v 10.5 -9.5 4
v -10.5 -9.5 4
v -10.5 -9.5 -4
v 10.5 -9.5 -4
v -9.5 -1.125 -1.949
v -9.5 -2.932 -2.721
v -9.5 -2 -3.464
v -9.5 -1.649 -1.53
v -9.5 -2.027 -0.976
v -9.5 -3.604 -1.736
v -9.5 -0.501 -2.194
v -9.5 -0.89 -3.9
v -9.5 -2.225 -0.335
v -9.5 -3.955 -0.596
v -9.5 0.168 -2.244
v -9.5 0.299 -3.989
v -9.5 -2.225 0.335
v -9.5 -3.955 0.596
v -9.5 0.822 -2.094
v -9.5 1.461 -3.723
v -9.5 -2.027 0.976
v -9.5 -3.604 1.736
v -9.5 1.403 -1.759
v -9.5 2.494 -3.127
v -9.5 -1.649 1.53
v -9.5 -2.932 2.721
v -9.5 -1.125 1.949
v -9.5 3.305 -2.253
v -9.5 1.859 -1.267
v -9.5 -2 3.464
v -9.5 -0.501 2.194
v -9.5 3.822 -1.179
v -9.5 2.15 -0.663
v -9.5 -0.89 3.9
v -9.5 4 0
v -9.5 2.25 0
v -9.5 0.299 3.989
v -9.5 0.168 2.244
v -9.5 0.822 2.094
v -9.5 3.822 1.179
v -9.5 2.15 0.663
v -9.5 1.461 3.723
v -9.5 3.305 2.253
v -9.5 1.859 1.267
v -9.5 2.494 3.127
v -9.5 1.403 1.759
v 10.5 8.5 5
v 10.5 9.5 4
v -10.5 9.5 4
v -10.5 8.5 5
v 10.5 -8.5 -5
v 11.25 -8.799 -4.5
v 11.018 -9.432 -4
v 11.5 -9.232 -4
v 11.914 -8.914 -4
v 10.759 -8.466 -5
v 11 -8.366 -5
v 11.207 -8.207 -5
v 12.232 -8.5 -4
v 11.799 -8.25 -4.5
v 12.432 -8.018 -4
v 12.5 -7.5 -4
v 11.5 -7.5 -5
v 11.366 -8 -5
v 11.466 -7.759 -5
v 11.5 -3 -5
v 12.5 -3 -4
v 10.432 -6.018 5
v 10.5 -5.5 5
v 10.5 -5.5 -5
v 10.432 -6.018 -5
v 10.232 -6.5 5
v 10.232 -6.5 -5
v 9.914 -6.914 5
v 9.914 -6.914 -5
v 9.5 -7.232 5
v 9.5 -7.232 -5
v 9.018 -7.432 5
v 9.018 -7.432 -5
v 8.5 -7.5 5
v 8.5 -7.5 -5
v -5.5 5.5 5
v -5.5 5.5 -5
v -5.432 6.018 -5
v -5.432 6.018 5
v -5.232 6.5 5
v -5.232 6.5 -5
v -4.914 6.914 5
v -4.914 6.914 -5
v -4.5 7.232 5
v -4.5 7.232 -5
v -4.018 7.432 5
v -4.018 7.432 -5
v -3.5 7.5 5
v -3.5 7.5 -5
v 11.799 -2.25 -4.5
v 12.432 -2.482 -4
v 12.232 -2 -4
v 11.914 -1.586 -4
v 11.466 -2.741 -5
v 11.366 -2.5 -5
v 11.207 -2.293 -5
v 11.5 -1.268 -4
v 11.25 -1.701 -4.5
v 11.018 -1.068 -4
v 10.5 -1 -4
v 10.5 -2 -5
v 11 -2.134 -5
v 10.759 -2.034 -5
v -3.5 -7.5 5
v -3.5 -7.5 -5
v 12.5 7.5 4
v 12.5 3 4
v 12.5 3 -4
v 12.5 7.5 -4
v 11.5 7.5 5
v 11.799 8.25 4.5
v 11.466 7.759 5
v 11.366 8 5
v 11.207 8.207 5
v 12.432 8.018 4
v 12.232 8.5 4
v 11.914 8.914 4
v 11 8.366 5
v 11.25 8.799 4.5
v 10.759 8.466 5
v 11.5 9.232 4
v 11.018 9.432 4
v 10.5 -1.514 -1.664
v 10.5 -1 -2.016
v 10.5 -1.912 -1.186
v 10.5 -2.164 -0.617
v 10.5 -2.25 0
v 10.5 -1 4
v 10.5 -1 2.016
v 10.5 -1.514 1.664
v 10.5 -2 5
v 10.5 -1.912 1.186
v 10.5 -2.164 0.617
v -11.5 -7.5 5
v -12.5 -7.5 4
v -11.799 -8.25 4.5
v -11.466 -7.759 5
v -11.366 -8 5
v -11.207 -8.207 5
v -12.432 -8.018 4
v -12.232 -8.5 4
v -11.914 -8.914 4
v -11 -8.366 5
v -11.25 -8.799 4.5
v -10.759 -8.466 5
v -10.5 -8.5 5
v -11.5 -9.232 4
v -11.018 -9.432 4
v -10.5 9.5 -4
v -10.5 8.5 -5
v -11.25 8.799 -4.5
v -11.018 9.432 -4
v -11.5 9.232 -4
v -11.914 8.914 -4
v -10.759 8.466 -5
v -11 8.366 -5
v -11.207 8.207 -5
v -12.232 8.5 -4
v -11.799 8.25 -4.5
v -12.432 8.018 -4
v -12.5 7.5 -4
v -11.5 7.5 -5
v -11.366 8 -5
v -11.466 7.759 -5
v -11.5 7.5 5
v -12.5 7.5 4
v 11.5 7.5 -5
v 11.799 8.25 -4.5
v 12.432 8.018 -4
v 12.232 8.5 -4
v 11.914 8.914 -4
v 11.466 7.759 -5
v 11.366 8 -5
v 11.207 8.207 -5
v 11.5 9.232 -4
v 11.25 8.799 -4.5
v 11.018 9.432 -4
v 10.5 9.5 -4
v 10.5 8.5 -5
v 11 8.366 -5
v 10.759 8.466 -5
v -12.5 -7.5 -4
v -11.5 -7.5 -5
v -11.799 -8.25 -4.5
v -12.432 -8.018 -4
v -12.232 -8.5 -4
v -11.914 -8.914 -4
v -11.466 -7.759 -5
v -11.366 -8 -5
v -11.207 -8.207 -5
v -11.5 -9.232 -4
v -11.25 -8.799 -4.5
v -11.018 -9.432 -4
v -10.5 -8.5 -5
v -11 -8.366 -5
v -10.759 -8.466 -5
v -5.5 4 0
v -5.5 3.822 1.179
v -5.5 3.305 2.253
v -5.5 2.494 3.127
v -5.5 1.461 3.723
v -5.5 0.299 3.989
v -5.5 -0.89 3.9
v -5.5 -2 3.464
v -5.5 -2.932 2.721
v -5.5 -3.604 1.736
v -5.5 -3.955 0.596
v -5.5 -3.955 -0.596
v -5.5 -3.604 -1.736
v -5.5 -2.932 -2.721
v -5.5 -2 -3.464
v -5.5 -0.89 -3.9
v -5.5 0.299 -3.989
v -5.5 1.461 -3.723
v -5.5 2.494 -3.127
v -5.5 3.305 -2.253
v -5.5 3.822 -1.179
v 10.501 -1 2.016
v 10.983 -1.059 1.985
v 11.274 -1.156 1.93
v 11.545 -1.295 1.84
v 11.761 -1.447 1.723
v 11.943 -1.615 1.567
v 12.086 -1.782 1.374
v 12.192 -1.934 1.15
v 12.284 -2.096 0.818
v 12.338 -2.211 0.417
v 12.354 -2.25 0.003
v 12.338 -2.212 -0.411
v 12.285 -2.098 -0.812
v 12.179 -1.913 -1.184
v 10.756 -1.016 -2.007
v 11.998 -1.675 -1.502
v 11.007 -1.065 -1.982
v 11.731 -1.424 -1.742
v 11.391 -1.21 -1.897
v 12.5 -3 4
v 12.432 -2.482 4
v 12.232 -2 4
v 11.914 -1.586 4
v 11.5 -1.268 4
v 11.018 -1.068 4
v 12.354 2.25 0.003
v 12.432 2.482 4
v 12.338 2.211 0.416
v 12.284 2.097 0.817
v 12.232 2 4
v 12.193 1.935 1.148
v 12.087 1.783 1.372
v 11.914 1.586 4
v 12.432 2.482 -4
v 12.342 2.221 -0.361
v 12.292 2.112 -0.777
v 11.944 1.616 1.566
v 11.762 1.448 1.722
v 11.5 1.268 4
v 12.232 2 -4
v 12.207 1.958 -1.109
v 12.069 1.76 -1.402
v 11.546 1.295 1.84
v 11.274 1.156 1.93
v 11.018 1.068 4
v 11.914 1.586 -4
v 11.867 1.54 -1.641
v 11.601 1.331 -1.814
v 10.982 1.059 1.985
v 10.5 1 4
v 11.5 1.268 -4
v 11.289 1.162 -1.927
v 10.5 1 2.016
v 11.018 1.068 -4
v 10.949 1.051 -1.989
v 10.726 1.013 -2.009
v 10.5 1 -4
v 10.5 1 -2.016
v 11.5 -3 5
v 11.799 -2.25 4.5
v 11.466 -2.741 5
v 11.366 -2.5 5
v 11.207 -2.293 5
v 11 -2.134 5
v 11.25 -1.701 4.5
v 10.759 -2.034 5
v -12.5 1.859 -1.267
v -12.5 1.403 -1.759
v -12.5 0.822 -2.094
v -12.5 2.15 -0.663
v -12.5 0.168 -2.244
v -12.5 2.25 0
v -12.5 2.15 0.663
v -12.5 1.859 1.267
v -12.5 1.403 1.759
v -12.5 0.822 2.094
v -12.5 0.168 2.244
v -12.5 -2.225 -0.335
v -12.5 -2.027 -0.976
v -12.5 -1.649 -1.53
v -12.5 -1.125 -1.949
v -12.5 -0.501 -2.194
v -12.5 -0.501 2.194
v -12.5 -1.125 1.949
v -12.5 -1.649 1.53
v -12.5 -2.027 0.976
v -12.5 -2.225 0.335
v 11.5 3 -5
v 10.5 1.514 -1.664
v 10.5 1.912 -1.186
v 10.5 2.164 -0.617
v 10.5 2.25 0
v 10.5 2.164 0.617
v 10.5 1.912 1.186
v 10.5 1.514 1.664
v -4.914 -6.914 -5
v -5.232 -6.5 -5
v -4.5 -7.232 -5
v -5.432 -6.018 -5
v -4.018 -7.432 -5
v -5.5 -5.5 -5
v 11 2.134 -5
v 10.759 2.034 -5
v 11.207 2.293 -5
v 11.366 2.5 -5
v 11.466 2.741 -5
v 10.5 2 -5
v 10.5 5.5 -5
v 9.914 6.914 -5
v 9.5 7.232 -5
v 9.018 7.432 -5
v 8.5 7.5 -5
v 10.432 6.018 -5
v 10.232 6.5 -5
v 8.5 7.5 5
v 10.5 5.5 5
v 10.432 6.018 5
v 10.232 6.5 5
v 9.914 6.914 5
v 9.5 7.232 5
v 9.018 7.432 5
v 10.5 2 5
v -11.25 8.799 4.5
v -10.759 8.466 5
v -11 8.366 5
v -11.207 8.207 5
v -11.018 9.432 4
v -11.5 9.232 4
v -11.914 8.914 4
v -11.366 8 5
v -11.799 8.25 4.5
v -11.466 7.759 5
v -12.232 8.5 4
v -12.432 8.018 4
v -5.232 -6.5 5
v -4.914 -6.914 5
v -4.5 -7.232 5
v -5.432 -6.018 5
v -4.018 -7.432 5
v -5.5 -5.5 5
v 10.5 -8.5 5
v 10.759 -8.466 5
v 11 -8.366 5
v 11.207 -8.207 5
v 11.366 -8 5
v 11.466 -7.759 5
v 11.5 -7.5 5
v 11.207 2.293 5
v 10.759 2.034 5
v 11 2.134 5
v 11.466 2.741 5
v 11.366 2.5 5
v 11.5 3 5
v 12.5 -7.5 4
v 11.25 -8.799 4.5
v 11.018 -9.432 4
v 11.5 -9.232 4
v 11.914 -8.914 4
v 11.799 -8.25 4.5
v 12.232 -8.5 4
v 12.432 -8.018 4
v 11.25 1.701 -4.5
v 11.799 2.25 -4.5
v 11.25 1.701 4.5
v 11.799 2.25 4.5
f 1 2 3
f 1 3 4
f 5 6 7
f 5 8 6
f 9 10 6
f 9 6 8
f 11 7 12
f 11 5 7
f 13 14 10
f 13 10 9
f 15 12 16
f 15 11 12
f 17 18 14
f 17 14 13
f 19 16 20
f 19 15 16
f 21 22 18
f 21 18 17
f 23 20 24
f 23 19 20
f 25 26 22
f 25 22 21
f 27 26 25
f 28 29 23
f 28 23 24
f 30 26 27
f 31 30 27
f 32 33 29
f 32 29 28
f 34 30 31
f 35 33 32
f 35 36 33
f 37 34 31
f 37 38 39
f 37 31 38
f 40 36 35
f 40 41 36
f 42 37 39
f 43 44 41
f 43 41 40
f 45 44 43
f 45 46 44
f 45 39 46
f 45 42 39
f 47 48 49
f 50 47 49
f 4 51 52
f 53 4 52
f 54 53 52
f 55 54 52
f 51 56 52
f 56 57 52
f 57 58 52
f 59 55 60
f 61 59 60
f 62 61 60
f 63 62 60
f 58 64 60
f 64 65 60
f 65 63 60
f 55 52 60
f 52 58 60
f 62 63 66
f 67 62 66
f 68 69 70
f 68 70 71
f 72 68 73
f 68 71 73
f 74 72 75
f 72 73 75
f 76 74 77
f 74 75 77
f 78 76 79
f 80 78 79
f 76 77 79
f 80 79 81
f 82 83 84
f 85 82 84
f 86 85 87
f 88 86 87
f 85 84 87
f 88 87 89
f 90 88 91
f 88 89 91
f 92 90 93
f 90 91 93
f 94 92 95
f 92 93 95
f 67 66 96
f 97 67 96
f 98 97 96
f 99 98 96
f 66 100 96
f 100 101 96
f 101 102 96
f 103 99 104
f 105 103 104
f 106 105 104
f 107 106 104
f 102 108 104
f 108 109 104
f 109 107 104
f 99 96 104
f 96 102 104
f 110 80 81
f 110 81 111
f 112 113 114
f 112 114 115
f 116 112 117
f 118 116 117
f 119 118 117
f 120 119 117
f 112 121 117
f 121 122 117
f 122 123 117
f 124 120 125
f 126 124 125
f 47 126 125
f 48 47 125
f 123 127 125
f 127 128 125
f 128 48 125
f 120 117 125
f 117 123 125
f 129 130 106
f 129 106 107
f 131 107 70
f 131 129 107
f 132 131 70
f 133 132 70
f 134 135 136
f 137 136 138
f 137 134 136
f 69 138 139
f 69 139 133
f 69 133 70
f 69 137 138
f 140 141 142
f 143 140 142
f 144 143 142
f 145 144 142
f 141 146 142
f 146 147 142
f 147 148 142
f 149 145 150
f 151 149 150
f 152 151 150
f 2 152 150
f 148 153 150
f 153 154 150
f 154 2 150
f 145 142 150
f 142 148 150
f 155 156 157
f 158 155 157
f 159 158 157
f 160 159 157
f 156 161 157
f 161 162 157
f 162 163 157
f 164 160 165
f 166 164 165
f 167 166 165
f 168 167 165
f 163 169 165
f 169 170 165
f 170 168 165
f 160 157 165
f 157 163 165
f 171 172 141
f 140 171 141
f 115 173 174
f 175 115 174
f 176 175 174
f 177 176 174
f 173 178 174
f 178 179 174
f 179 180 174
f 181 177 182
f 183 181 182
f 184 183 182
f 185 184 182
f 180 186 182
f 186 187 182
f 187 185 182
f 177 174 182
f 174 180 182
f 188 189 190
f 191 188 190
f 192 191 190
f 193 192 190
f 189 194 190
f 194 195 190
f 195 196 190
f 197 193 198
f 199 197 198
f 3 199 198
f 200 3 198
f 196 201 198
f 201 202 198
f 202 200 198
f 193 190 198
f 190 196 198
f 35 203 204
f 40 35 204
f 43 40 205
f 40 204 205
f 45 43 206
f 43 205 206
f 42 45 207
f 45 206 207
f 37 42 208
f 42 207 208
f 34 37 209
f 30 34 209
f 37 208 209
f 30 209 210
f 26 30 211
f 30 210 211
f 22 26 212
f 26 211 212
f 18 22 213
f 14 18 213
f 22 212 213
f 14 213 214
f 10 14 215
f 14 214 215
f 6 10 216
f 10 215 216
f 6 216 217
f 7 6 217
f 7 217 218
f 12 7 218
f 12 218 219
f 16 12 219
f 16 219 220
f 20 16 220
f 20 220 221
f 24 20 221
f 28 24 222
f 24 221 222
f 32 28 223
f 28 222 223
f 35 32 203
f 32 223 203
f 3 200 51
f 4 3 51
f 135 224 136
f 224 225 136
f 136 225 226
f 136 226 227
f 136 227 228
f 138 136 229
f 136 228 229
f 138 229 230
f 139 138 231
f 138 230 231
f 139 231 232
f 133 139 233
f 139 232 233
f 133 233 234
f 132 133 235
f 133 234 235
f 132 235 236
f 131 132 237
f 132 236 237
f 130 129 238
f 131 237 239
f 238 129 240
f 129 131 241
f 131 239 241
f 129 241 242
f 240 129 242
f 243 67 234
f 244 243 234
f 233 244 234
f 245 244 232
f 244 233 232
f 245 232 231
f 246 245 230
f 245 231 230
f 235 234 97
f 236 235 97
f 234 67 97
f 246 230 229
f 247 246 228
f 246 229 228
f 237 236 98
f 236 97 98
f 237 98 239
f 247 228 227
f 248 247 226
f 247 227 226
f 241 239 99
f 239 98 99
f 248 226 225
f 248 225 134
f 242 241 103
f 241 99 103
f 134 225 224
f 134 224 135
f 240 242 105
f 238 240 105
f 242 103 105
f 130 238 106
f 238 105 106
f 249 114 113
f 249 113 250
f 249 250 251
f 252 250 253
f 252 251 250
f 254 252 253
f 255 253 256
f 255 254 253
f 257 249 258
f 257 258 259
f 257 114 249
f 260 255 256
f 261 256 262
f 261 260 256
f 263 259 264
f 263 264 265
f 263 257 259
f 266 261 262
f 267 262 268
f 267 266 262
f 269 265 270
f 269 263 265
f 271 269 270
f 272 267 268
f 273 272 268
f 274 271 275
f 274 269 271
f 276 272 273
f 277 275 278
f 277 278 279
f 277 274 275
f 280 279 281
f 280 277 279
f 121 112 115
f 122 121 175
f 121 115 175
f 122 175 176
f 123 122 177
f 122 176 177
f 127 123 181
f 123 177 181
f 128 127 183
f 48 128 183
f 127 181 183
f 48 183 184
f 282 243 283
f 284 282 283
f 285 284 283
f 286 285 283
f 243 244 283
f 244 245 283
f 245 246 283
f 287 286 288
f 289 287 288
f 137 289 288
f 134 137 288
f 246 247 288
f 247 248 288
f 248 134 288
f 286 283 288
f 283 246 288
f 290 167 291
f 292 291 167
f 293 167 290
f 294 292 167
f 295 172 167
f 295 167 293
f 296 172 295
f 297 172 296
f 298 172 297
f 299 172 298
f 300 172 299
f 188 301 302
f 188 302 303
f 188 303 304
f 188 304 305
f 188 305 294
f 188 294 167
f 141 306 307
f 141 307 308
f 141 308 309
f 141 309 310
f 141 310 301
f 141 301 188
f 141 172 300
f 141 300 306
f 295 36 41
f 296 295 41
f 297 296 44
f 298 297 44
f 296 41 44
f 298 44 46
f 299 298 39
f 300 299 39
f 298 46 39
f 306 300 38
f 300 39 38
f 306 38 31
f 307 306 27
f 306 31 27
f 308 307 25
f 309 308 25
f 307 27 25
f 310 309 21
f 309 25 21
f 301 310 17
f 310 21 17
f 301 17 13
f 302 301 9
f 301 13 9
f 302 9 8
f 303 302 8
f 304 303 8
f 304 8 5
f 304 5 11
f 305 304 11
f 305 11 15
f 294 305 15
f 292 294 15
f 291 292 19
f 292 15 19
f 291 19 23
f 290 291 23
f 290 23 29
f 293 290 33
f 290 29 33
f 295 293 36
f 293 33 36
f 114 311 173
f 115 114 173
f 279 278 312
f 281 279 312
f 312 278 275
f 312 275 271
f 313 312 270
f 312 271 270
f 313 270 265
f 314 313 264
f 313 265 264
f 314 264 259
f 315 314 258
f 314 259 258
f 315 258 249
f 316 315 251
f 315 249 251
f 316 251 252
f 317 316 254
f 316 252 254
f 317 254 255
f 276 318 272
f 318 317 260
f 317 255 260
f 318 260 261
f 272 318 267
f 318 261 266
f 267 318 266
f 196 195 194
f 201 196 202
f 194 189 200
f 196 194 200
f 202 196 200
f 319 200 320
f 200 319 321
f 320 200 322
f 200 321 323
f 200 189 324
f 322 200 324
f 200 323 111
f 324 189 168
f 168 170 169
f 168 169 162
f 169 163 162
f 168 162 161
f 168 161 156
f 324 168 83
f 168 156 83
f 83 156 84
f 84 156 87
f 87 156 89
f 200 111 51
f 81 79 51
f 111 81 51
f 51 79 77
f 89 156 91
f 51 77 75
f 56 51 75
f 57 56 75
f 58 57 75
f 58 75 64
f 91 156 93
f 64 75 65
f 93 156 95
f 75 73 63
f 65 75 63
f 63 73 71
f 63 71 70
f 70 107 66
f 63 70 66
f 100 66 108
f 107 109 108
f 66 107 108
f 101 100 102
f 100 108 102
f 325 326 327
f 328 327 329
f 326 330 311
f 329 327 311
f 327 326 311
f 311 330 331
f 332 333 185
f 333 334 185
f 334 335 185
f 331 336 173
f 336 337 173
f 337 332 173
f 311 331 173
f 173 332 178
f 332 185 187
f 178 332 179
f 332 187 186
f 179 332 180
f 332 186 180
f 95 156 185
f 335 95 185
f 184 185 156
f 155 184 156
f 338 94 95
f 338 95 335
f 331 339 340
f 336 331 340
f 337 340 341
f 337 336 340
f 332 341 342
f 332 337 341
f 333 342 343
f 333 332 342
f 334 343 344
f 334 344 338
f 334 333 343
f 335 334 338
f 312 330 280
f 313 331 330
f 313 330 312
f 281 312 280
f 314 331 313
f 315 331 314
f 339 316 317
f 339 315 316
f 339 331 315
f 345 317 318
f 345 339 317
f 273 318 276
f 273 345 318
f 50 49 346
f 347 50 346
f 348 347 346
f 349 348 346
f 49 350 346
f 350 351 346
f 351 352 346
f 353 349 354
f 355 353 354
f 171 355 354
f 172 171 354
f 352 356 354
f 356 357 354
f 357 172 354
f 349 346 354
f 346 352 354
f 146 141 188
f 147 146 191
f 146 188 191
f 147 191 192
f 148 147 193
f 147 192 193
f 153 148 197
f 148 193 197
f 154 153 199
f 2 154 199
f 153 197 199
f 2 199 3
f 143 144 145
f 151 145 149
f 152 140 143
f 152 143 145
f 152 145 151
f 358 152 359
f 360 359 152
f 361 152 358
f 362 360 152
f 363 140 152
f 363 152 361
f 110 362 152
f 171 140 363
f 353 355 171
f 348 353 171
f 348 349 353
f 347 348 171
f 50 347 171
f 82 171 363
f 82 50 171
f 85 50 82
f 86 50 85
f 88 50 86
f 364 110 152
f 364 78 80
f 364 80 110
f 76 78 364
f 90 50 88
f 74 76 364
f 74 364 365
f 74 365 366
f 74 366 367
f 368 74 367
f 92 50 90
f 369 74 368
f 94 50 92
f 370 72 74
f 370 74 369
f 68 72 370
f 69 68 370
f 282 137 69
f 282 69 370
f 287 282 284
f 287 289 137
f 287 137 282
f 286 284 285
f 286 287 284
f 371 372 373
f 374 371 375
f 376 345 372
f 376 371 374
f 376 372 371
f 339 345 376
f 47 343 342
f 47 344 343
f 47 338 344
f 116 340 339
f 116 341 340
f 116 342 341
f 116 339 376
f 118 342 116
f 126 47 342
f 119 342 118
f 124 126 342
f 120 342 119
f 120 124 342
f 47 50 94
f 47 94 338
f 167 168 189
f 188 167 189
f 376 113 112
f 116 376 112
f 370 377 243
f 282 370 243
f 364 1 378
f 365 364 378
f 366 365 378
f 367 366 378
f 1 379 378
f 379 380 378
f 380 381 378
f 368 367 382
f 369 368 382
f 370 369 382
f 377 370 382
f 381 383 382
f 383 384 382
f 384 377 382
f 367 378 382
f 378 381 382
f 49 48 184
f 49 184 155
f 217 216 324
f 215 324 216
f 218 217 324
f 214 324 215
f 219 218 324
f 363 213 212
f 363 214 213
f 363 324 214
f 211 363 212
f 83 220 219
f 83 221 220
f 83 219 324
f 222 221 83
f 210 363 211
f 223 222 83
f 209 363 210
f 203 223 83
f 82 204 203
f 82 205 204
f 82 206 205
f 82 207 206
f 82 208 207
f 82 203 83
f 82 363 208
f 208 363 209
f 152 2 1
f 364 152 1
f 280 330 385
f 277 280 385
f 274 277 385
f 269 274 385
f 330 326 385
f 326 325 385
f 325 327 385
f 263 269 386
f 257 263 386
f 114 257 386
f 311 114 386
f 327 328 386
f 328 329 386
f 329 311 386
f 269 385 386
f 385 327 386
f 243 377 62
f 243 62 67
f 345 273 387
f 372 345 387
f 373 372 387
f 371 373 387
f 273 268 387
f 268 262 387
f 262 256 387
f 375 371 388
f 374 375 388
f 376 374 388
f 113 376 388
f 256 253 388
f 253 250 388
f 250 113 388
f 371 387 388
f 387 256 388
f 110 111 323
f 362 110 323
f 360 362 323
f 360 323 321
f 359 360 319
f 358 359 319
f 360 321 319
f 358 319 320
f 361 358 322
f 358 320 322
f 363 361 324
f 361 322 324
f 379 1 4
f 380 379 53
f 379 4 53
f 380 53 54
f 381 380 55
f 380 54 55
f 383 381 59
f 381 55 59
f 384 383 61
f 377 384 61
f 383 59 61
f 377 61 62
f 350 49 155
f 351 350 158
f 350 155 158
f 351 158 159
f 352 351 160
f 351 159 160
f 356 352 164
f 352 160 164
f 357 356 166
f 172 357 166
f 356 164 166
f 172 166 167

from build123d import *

# Parameters (mm, degrees)
F1_DEPTH    = 5
F2_R        = 2.25
F3_DEPTH    = 100
F4_R        = 4
F5_DEPTH    = 4
F6_T1_DEPTH = 10
F6_T3_DEPTH = 20
F6_T5_DEPTH = 12.9844355629
F6_T7_DEPTH = 12.9844355629
F7_SIZE     = 1


# Not quite as in the source:
# - a fillet or chamfer that OpenCascade refuses, or shapes differently, is made with other operations: its cross-section is extruded or revolved along the edge and cut away or added


with BuildPart() as f1:
    # F0 (on Top) → F1 (new body, symmetric)
    with BuildSketch(Plane.XY):
        Polygon((12.5, 1), (12.5, 9.5), (-12.5, 9.5), (-12.5, -9.5), (12.5, -9.5), (12.5, -1), (10.5, -1), (10.5, -7.5), (-5.5, -7.5), (-5.5, 7.5), (10.5, 7.5), (10.5, 1), align=None)
    extrude(amount=F1_DEPTH, both=True)

    # F2 (on face) → F3 (cut, symmetric)
    with BuildSketch(Plane.YZ.offset(-5.5)):
        Circle(F2_R)
    extrude(amount=F3_DEPTH, both=True, mode=Mode.SUBTRACT)

    # F4 (on face) → F5 (cut)
    with BuildSketch(Plane.YZ.offset(-5.5)):
        Circle(F4_R)
    extrude(amount=-F5_DEPTH, mode=Mode.SUBTRACT)

    # F6: fillet of radius 2 on 12 edges, made by hand

    # F6_s2 → F6_t1 (join)
    with BuildSketch(Plane.XY.offset(-5)):
        with BuildLine():
            ThreePointArc((10.5, -5.5), (9.9142135624, -6.9142135624), (8.5, -7.5))
            Line((8.5, -7.5), (10.5, -7.5))
            Line((10.5, -7.5), (10.5, -5.5))
        make_face()
        with BuildLine():
            ThreePointArc((10.5, 5.5), (9.9142135624, 6.9142135624), (8.5, 7.5))
            Line((8.5, 7.5), (10.5, 7.5))
            Line((10.5, 7.5), (10.5, 5.5))
        make_face()
        with BuildLine():
            ThreePointArc((-5.5, 5.5), (-4.9142135624, 6.9142135624), (-3.5, 7.5))
            Line((-3.5, 7.5), (-5.5, 7.5))
            Line((-5.5, 7.5), (-5.5, 5.5))
        make_face()
        with BuildLine():
            ThreePointArc((-3.5, -7.5), (-4.9142135624, -6.9142135624), (-5.5, -5.5))
            Line((-5.5, -5.5), (-5.5, -7.5))
            Line((-5.5, -7.5), (-3.5, -7.5))
        make_face()
    extrude(amount=F6_T1_DEPTH)

    # F6_s4 → F6_t3 (cut)
    with BuildSketch(Plane.XY.offset(-10)):
        with BuildLine():
            ThreePointArc((-10.5, 9.5), (-11.9142135624, 8.9142135624), (-12.5, 7.5))
            Line((-12.5, 7.5), (-12.5, 9.5))
            Line((-12.5, 9.5), (-10.5, 9.5))
        make_face()
        with BuildLine():
            ThreePointArc((-12.5, -7.5), (-11.9142135624, -8.9142135624), (-10.5, -9.5))
            Line((-10.5, -9.5), (-12.5, -9.5))
            Line((-12.5, -9.5), (-12.5, -7.5))
        make_face()
        with BuildLine():
            ThreePointArc((12.5, 7.5), (11.9142135624, 8.9142135624), (10.5, 9.5))
            Line((10.5, 9.5), (12.5, 9.5))
            Line((12.5, 9.5), (12.5, 7.5))
        make_face()
        with BuildLine():
            ThreePointArc((10.5, -9.5), (11.9142135624, -8.9142135624), (12.5, -7.5))
            Line((12.5, -7.5), (12.5, -9.5))
            Line((12.5, -9.5), (10.5, -9.5))
        make_face()
    extrude(amount=F6_T3_DEPTH, mode=Mode.SUBTRACT)

    # F6_s6 → F6_t5 (cut)
    with BuildSketch(Plane.XY.offset(-2.9844355629)):
        with BuildLine():
            ThreePointArc((12.5, -3), (11.9142135624, -1.5857864376), (10.5, -1))
            Line((10.5, -1), (12.5, -1))
            Line((12.5, -1), (12.5, -3))
        make_face()
        with BuildLine():
            ThreePointArc((12.5, 3), (11.9142135624, 1.5857864376), (10.5, 1))
            Line((10.5, 1), (12.5, 1))
            Line((12.5, 1), (12.5, 3))
        make_face()
    extrude(amount=F6_T5_DEPTH, mode=Mode.SUBTRACT)

    # F6_s8 → F6_t7 (cut)
    with BuildSketch(Plane.XY.offset(-10)):
        with BuildLine():
            ThreePointArc((12.5, -3), (11.9142135624, -1.5857864376), (10.5, -1))
            Line((10.5, -1), (12.5, -1))
            Line((12.5, -1), (12.5, -3))
        make_face()
        with BuildLine():
            ThreePointArc((12.5, 3), (11.9142135624, 1.5857864376), (10.5, 1))
            Line((10.5, 1), (12.5, 1))
            Line((12.5, 1), (12.5, 3))
        make_face()
    extrude(amount=F6_T7_DEPTH, mode=Mode.SUBTRACT)

    # F7
    f7_edges = [f1.edges().sort_by_distance(p)[0] for p in [
        (0, 9.5, 5),
        (-12.5, 0, -5),
    ]]
    chamfer(f7_edges, length=F7_SIZE)


solid = f1.part
